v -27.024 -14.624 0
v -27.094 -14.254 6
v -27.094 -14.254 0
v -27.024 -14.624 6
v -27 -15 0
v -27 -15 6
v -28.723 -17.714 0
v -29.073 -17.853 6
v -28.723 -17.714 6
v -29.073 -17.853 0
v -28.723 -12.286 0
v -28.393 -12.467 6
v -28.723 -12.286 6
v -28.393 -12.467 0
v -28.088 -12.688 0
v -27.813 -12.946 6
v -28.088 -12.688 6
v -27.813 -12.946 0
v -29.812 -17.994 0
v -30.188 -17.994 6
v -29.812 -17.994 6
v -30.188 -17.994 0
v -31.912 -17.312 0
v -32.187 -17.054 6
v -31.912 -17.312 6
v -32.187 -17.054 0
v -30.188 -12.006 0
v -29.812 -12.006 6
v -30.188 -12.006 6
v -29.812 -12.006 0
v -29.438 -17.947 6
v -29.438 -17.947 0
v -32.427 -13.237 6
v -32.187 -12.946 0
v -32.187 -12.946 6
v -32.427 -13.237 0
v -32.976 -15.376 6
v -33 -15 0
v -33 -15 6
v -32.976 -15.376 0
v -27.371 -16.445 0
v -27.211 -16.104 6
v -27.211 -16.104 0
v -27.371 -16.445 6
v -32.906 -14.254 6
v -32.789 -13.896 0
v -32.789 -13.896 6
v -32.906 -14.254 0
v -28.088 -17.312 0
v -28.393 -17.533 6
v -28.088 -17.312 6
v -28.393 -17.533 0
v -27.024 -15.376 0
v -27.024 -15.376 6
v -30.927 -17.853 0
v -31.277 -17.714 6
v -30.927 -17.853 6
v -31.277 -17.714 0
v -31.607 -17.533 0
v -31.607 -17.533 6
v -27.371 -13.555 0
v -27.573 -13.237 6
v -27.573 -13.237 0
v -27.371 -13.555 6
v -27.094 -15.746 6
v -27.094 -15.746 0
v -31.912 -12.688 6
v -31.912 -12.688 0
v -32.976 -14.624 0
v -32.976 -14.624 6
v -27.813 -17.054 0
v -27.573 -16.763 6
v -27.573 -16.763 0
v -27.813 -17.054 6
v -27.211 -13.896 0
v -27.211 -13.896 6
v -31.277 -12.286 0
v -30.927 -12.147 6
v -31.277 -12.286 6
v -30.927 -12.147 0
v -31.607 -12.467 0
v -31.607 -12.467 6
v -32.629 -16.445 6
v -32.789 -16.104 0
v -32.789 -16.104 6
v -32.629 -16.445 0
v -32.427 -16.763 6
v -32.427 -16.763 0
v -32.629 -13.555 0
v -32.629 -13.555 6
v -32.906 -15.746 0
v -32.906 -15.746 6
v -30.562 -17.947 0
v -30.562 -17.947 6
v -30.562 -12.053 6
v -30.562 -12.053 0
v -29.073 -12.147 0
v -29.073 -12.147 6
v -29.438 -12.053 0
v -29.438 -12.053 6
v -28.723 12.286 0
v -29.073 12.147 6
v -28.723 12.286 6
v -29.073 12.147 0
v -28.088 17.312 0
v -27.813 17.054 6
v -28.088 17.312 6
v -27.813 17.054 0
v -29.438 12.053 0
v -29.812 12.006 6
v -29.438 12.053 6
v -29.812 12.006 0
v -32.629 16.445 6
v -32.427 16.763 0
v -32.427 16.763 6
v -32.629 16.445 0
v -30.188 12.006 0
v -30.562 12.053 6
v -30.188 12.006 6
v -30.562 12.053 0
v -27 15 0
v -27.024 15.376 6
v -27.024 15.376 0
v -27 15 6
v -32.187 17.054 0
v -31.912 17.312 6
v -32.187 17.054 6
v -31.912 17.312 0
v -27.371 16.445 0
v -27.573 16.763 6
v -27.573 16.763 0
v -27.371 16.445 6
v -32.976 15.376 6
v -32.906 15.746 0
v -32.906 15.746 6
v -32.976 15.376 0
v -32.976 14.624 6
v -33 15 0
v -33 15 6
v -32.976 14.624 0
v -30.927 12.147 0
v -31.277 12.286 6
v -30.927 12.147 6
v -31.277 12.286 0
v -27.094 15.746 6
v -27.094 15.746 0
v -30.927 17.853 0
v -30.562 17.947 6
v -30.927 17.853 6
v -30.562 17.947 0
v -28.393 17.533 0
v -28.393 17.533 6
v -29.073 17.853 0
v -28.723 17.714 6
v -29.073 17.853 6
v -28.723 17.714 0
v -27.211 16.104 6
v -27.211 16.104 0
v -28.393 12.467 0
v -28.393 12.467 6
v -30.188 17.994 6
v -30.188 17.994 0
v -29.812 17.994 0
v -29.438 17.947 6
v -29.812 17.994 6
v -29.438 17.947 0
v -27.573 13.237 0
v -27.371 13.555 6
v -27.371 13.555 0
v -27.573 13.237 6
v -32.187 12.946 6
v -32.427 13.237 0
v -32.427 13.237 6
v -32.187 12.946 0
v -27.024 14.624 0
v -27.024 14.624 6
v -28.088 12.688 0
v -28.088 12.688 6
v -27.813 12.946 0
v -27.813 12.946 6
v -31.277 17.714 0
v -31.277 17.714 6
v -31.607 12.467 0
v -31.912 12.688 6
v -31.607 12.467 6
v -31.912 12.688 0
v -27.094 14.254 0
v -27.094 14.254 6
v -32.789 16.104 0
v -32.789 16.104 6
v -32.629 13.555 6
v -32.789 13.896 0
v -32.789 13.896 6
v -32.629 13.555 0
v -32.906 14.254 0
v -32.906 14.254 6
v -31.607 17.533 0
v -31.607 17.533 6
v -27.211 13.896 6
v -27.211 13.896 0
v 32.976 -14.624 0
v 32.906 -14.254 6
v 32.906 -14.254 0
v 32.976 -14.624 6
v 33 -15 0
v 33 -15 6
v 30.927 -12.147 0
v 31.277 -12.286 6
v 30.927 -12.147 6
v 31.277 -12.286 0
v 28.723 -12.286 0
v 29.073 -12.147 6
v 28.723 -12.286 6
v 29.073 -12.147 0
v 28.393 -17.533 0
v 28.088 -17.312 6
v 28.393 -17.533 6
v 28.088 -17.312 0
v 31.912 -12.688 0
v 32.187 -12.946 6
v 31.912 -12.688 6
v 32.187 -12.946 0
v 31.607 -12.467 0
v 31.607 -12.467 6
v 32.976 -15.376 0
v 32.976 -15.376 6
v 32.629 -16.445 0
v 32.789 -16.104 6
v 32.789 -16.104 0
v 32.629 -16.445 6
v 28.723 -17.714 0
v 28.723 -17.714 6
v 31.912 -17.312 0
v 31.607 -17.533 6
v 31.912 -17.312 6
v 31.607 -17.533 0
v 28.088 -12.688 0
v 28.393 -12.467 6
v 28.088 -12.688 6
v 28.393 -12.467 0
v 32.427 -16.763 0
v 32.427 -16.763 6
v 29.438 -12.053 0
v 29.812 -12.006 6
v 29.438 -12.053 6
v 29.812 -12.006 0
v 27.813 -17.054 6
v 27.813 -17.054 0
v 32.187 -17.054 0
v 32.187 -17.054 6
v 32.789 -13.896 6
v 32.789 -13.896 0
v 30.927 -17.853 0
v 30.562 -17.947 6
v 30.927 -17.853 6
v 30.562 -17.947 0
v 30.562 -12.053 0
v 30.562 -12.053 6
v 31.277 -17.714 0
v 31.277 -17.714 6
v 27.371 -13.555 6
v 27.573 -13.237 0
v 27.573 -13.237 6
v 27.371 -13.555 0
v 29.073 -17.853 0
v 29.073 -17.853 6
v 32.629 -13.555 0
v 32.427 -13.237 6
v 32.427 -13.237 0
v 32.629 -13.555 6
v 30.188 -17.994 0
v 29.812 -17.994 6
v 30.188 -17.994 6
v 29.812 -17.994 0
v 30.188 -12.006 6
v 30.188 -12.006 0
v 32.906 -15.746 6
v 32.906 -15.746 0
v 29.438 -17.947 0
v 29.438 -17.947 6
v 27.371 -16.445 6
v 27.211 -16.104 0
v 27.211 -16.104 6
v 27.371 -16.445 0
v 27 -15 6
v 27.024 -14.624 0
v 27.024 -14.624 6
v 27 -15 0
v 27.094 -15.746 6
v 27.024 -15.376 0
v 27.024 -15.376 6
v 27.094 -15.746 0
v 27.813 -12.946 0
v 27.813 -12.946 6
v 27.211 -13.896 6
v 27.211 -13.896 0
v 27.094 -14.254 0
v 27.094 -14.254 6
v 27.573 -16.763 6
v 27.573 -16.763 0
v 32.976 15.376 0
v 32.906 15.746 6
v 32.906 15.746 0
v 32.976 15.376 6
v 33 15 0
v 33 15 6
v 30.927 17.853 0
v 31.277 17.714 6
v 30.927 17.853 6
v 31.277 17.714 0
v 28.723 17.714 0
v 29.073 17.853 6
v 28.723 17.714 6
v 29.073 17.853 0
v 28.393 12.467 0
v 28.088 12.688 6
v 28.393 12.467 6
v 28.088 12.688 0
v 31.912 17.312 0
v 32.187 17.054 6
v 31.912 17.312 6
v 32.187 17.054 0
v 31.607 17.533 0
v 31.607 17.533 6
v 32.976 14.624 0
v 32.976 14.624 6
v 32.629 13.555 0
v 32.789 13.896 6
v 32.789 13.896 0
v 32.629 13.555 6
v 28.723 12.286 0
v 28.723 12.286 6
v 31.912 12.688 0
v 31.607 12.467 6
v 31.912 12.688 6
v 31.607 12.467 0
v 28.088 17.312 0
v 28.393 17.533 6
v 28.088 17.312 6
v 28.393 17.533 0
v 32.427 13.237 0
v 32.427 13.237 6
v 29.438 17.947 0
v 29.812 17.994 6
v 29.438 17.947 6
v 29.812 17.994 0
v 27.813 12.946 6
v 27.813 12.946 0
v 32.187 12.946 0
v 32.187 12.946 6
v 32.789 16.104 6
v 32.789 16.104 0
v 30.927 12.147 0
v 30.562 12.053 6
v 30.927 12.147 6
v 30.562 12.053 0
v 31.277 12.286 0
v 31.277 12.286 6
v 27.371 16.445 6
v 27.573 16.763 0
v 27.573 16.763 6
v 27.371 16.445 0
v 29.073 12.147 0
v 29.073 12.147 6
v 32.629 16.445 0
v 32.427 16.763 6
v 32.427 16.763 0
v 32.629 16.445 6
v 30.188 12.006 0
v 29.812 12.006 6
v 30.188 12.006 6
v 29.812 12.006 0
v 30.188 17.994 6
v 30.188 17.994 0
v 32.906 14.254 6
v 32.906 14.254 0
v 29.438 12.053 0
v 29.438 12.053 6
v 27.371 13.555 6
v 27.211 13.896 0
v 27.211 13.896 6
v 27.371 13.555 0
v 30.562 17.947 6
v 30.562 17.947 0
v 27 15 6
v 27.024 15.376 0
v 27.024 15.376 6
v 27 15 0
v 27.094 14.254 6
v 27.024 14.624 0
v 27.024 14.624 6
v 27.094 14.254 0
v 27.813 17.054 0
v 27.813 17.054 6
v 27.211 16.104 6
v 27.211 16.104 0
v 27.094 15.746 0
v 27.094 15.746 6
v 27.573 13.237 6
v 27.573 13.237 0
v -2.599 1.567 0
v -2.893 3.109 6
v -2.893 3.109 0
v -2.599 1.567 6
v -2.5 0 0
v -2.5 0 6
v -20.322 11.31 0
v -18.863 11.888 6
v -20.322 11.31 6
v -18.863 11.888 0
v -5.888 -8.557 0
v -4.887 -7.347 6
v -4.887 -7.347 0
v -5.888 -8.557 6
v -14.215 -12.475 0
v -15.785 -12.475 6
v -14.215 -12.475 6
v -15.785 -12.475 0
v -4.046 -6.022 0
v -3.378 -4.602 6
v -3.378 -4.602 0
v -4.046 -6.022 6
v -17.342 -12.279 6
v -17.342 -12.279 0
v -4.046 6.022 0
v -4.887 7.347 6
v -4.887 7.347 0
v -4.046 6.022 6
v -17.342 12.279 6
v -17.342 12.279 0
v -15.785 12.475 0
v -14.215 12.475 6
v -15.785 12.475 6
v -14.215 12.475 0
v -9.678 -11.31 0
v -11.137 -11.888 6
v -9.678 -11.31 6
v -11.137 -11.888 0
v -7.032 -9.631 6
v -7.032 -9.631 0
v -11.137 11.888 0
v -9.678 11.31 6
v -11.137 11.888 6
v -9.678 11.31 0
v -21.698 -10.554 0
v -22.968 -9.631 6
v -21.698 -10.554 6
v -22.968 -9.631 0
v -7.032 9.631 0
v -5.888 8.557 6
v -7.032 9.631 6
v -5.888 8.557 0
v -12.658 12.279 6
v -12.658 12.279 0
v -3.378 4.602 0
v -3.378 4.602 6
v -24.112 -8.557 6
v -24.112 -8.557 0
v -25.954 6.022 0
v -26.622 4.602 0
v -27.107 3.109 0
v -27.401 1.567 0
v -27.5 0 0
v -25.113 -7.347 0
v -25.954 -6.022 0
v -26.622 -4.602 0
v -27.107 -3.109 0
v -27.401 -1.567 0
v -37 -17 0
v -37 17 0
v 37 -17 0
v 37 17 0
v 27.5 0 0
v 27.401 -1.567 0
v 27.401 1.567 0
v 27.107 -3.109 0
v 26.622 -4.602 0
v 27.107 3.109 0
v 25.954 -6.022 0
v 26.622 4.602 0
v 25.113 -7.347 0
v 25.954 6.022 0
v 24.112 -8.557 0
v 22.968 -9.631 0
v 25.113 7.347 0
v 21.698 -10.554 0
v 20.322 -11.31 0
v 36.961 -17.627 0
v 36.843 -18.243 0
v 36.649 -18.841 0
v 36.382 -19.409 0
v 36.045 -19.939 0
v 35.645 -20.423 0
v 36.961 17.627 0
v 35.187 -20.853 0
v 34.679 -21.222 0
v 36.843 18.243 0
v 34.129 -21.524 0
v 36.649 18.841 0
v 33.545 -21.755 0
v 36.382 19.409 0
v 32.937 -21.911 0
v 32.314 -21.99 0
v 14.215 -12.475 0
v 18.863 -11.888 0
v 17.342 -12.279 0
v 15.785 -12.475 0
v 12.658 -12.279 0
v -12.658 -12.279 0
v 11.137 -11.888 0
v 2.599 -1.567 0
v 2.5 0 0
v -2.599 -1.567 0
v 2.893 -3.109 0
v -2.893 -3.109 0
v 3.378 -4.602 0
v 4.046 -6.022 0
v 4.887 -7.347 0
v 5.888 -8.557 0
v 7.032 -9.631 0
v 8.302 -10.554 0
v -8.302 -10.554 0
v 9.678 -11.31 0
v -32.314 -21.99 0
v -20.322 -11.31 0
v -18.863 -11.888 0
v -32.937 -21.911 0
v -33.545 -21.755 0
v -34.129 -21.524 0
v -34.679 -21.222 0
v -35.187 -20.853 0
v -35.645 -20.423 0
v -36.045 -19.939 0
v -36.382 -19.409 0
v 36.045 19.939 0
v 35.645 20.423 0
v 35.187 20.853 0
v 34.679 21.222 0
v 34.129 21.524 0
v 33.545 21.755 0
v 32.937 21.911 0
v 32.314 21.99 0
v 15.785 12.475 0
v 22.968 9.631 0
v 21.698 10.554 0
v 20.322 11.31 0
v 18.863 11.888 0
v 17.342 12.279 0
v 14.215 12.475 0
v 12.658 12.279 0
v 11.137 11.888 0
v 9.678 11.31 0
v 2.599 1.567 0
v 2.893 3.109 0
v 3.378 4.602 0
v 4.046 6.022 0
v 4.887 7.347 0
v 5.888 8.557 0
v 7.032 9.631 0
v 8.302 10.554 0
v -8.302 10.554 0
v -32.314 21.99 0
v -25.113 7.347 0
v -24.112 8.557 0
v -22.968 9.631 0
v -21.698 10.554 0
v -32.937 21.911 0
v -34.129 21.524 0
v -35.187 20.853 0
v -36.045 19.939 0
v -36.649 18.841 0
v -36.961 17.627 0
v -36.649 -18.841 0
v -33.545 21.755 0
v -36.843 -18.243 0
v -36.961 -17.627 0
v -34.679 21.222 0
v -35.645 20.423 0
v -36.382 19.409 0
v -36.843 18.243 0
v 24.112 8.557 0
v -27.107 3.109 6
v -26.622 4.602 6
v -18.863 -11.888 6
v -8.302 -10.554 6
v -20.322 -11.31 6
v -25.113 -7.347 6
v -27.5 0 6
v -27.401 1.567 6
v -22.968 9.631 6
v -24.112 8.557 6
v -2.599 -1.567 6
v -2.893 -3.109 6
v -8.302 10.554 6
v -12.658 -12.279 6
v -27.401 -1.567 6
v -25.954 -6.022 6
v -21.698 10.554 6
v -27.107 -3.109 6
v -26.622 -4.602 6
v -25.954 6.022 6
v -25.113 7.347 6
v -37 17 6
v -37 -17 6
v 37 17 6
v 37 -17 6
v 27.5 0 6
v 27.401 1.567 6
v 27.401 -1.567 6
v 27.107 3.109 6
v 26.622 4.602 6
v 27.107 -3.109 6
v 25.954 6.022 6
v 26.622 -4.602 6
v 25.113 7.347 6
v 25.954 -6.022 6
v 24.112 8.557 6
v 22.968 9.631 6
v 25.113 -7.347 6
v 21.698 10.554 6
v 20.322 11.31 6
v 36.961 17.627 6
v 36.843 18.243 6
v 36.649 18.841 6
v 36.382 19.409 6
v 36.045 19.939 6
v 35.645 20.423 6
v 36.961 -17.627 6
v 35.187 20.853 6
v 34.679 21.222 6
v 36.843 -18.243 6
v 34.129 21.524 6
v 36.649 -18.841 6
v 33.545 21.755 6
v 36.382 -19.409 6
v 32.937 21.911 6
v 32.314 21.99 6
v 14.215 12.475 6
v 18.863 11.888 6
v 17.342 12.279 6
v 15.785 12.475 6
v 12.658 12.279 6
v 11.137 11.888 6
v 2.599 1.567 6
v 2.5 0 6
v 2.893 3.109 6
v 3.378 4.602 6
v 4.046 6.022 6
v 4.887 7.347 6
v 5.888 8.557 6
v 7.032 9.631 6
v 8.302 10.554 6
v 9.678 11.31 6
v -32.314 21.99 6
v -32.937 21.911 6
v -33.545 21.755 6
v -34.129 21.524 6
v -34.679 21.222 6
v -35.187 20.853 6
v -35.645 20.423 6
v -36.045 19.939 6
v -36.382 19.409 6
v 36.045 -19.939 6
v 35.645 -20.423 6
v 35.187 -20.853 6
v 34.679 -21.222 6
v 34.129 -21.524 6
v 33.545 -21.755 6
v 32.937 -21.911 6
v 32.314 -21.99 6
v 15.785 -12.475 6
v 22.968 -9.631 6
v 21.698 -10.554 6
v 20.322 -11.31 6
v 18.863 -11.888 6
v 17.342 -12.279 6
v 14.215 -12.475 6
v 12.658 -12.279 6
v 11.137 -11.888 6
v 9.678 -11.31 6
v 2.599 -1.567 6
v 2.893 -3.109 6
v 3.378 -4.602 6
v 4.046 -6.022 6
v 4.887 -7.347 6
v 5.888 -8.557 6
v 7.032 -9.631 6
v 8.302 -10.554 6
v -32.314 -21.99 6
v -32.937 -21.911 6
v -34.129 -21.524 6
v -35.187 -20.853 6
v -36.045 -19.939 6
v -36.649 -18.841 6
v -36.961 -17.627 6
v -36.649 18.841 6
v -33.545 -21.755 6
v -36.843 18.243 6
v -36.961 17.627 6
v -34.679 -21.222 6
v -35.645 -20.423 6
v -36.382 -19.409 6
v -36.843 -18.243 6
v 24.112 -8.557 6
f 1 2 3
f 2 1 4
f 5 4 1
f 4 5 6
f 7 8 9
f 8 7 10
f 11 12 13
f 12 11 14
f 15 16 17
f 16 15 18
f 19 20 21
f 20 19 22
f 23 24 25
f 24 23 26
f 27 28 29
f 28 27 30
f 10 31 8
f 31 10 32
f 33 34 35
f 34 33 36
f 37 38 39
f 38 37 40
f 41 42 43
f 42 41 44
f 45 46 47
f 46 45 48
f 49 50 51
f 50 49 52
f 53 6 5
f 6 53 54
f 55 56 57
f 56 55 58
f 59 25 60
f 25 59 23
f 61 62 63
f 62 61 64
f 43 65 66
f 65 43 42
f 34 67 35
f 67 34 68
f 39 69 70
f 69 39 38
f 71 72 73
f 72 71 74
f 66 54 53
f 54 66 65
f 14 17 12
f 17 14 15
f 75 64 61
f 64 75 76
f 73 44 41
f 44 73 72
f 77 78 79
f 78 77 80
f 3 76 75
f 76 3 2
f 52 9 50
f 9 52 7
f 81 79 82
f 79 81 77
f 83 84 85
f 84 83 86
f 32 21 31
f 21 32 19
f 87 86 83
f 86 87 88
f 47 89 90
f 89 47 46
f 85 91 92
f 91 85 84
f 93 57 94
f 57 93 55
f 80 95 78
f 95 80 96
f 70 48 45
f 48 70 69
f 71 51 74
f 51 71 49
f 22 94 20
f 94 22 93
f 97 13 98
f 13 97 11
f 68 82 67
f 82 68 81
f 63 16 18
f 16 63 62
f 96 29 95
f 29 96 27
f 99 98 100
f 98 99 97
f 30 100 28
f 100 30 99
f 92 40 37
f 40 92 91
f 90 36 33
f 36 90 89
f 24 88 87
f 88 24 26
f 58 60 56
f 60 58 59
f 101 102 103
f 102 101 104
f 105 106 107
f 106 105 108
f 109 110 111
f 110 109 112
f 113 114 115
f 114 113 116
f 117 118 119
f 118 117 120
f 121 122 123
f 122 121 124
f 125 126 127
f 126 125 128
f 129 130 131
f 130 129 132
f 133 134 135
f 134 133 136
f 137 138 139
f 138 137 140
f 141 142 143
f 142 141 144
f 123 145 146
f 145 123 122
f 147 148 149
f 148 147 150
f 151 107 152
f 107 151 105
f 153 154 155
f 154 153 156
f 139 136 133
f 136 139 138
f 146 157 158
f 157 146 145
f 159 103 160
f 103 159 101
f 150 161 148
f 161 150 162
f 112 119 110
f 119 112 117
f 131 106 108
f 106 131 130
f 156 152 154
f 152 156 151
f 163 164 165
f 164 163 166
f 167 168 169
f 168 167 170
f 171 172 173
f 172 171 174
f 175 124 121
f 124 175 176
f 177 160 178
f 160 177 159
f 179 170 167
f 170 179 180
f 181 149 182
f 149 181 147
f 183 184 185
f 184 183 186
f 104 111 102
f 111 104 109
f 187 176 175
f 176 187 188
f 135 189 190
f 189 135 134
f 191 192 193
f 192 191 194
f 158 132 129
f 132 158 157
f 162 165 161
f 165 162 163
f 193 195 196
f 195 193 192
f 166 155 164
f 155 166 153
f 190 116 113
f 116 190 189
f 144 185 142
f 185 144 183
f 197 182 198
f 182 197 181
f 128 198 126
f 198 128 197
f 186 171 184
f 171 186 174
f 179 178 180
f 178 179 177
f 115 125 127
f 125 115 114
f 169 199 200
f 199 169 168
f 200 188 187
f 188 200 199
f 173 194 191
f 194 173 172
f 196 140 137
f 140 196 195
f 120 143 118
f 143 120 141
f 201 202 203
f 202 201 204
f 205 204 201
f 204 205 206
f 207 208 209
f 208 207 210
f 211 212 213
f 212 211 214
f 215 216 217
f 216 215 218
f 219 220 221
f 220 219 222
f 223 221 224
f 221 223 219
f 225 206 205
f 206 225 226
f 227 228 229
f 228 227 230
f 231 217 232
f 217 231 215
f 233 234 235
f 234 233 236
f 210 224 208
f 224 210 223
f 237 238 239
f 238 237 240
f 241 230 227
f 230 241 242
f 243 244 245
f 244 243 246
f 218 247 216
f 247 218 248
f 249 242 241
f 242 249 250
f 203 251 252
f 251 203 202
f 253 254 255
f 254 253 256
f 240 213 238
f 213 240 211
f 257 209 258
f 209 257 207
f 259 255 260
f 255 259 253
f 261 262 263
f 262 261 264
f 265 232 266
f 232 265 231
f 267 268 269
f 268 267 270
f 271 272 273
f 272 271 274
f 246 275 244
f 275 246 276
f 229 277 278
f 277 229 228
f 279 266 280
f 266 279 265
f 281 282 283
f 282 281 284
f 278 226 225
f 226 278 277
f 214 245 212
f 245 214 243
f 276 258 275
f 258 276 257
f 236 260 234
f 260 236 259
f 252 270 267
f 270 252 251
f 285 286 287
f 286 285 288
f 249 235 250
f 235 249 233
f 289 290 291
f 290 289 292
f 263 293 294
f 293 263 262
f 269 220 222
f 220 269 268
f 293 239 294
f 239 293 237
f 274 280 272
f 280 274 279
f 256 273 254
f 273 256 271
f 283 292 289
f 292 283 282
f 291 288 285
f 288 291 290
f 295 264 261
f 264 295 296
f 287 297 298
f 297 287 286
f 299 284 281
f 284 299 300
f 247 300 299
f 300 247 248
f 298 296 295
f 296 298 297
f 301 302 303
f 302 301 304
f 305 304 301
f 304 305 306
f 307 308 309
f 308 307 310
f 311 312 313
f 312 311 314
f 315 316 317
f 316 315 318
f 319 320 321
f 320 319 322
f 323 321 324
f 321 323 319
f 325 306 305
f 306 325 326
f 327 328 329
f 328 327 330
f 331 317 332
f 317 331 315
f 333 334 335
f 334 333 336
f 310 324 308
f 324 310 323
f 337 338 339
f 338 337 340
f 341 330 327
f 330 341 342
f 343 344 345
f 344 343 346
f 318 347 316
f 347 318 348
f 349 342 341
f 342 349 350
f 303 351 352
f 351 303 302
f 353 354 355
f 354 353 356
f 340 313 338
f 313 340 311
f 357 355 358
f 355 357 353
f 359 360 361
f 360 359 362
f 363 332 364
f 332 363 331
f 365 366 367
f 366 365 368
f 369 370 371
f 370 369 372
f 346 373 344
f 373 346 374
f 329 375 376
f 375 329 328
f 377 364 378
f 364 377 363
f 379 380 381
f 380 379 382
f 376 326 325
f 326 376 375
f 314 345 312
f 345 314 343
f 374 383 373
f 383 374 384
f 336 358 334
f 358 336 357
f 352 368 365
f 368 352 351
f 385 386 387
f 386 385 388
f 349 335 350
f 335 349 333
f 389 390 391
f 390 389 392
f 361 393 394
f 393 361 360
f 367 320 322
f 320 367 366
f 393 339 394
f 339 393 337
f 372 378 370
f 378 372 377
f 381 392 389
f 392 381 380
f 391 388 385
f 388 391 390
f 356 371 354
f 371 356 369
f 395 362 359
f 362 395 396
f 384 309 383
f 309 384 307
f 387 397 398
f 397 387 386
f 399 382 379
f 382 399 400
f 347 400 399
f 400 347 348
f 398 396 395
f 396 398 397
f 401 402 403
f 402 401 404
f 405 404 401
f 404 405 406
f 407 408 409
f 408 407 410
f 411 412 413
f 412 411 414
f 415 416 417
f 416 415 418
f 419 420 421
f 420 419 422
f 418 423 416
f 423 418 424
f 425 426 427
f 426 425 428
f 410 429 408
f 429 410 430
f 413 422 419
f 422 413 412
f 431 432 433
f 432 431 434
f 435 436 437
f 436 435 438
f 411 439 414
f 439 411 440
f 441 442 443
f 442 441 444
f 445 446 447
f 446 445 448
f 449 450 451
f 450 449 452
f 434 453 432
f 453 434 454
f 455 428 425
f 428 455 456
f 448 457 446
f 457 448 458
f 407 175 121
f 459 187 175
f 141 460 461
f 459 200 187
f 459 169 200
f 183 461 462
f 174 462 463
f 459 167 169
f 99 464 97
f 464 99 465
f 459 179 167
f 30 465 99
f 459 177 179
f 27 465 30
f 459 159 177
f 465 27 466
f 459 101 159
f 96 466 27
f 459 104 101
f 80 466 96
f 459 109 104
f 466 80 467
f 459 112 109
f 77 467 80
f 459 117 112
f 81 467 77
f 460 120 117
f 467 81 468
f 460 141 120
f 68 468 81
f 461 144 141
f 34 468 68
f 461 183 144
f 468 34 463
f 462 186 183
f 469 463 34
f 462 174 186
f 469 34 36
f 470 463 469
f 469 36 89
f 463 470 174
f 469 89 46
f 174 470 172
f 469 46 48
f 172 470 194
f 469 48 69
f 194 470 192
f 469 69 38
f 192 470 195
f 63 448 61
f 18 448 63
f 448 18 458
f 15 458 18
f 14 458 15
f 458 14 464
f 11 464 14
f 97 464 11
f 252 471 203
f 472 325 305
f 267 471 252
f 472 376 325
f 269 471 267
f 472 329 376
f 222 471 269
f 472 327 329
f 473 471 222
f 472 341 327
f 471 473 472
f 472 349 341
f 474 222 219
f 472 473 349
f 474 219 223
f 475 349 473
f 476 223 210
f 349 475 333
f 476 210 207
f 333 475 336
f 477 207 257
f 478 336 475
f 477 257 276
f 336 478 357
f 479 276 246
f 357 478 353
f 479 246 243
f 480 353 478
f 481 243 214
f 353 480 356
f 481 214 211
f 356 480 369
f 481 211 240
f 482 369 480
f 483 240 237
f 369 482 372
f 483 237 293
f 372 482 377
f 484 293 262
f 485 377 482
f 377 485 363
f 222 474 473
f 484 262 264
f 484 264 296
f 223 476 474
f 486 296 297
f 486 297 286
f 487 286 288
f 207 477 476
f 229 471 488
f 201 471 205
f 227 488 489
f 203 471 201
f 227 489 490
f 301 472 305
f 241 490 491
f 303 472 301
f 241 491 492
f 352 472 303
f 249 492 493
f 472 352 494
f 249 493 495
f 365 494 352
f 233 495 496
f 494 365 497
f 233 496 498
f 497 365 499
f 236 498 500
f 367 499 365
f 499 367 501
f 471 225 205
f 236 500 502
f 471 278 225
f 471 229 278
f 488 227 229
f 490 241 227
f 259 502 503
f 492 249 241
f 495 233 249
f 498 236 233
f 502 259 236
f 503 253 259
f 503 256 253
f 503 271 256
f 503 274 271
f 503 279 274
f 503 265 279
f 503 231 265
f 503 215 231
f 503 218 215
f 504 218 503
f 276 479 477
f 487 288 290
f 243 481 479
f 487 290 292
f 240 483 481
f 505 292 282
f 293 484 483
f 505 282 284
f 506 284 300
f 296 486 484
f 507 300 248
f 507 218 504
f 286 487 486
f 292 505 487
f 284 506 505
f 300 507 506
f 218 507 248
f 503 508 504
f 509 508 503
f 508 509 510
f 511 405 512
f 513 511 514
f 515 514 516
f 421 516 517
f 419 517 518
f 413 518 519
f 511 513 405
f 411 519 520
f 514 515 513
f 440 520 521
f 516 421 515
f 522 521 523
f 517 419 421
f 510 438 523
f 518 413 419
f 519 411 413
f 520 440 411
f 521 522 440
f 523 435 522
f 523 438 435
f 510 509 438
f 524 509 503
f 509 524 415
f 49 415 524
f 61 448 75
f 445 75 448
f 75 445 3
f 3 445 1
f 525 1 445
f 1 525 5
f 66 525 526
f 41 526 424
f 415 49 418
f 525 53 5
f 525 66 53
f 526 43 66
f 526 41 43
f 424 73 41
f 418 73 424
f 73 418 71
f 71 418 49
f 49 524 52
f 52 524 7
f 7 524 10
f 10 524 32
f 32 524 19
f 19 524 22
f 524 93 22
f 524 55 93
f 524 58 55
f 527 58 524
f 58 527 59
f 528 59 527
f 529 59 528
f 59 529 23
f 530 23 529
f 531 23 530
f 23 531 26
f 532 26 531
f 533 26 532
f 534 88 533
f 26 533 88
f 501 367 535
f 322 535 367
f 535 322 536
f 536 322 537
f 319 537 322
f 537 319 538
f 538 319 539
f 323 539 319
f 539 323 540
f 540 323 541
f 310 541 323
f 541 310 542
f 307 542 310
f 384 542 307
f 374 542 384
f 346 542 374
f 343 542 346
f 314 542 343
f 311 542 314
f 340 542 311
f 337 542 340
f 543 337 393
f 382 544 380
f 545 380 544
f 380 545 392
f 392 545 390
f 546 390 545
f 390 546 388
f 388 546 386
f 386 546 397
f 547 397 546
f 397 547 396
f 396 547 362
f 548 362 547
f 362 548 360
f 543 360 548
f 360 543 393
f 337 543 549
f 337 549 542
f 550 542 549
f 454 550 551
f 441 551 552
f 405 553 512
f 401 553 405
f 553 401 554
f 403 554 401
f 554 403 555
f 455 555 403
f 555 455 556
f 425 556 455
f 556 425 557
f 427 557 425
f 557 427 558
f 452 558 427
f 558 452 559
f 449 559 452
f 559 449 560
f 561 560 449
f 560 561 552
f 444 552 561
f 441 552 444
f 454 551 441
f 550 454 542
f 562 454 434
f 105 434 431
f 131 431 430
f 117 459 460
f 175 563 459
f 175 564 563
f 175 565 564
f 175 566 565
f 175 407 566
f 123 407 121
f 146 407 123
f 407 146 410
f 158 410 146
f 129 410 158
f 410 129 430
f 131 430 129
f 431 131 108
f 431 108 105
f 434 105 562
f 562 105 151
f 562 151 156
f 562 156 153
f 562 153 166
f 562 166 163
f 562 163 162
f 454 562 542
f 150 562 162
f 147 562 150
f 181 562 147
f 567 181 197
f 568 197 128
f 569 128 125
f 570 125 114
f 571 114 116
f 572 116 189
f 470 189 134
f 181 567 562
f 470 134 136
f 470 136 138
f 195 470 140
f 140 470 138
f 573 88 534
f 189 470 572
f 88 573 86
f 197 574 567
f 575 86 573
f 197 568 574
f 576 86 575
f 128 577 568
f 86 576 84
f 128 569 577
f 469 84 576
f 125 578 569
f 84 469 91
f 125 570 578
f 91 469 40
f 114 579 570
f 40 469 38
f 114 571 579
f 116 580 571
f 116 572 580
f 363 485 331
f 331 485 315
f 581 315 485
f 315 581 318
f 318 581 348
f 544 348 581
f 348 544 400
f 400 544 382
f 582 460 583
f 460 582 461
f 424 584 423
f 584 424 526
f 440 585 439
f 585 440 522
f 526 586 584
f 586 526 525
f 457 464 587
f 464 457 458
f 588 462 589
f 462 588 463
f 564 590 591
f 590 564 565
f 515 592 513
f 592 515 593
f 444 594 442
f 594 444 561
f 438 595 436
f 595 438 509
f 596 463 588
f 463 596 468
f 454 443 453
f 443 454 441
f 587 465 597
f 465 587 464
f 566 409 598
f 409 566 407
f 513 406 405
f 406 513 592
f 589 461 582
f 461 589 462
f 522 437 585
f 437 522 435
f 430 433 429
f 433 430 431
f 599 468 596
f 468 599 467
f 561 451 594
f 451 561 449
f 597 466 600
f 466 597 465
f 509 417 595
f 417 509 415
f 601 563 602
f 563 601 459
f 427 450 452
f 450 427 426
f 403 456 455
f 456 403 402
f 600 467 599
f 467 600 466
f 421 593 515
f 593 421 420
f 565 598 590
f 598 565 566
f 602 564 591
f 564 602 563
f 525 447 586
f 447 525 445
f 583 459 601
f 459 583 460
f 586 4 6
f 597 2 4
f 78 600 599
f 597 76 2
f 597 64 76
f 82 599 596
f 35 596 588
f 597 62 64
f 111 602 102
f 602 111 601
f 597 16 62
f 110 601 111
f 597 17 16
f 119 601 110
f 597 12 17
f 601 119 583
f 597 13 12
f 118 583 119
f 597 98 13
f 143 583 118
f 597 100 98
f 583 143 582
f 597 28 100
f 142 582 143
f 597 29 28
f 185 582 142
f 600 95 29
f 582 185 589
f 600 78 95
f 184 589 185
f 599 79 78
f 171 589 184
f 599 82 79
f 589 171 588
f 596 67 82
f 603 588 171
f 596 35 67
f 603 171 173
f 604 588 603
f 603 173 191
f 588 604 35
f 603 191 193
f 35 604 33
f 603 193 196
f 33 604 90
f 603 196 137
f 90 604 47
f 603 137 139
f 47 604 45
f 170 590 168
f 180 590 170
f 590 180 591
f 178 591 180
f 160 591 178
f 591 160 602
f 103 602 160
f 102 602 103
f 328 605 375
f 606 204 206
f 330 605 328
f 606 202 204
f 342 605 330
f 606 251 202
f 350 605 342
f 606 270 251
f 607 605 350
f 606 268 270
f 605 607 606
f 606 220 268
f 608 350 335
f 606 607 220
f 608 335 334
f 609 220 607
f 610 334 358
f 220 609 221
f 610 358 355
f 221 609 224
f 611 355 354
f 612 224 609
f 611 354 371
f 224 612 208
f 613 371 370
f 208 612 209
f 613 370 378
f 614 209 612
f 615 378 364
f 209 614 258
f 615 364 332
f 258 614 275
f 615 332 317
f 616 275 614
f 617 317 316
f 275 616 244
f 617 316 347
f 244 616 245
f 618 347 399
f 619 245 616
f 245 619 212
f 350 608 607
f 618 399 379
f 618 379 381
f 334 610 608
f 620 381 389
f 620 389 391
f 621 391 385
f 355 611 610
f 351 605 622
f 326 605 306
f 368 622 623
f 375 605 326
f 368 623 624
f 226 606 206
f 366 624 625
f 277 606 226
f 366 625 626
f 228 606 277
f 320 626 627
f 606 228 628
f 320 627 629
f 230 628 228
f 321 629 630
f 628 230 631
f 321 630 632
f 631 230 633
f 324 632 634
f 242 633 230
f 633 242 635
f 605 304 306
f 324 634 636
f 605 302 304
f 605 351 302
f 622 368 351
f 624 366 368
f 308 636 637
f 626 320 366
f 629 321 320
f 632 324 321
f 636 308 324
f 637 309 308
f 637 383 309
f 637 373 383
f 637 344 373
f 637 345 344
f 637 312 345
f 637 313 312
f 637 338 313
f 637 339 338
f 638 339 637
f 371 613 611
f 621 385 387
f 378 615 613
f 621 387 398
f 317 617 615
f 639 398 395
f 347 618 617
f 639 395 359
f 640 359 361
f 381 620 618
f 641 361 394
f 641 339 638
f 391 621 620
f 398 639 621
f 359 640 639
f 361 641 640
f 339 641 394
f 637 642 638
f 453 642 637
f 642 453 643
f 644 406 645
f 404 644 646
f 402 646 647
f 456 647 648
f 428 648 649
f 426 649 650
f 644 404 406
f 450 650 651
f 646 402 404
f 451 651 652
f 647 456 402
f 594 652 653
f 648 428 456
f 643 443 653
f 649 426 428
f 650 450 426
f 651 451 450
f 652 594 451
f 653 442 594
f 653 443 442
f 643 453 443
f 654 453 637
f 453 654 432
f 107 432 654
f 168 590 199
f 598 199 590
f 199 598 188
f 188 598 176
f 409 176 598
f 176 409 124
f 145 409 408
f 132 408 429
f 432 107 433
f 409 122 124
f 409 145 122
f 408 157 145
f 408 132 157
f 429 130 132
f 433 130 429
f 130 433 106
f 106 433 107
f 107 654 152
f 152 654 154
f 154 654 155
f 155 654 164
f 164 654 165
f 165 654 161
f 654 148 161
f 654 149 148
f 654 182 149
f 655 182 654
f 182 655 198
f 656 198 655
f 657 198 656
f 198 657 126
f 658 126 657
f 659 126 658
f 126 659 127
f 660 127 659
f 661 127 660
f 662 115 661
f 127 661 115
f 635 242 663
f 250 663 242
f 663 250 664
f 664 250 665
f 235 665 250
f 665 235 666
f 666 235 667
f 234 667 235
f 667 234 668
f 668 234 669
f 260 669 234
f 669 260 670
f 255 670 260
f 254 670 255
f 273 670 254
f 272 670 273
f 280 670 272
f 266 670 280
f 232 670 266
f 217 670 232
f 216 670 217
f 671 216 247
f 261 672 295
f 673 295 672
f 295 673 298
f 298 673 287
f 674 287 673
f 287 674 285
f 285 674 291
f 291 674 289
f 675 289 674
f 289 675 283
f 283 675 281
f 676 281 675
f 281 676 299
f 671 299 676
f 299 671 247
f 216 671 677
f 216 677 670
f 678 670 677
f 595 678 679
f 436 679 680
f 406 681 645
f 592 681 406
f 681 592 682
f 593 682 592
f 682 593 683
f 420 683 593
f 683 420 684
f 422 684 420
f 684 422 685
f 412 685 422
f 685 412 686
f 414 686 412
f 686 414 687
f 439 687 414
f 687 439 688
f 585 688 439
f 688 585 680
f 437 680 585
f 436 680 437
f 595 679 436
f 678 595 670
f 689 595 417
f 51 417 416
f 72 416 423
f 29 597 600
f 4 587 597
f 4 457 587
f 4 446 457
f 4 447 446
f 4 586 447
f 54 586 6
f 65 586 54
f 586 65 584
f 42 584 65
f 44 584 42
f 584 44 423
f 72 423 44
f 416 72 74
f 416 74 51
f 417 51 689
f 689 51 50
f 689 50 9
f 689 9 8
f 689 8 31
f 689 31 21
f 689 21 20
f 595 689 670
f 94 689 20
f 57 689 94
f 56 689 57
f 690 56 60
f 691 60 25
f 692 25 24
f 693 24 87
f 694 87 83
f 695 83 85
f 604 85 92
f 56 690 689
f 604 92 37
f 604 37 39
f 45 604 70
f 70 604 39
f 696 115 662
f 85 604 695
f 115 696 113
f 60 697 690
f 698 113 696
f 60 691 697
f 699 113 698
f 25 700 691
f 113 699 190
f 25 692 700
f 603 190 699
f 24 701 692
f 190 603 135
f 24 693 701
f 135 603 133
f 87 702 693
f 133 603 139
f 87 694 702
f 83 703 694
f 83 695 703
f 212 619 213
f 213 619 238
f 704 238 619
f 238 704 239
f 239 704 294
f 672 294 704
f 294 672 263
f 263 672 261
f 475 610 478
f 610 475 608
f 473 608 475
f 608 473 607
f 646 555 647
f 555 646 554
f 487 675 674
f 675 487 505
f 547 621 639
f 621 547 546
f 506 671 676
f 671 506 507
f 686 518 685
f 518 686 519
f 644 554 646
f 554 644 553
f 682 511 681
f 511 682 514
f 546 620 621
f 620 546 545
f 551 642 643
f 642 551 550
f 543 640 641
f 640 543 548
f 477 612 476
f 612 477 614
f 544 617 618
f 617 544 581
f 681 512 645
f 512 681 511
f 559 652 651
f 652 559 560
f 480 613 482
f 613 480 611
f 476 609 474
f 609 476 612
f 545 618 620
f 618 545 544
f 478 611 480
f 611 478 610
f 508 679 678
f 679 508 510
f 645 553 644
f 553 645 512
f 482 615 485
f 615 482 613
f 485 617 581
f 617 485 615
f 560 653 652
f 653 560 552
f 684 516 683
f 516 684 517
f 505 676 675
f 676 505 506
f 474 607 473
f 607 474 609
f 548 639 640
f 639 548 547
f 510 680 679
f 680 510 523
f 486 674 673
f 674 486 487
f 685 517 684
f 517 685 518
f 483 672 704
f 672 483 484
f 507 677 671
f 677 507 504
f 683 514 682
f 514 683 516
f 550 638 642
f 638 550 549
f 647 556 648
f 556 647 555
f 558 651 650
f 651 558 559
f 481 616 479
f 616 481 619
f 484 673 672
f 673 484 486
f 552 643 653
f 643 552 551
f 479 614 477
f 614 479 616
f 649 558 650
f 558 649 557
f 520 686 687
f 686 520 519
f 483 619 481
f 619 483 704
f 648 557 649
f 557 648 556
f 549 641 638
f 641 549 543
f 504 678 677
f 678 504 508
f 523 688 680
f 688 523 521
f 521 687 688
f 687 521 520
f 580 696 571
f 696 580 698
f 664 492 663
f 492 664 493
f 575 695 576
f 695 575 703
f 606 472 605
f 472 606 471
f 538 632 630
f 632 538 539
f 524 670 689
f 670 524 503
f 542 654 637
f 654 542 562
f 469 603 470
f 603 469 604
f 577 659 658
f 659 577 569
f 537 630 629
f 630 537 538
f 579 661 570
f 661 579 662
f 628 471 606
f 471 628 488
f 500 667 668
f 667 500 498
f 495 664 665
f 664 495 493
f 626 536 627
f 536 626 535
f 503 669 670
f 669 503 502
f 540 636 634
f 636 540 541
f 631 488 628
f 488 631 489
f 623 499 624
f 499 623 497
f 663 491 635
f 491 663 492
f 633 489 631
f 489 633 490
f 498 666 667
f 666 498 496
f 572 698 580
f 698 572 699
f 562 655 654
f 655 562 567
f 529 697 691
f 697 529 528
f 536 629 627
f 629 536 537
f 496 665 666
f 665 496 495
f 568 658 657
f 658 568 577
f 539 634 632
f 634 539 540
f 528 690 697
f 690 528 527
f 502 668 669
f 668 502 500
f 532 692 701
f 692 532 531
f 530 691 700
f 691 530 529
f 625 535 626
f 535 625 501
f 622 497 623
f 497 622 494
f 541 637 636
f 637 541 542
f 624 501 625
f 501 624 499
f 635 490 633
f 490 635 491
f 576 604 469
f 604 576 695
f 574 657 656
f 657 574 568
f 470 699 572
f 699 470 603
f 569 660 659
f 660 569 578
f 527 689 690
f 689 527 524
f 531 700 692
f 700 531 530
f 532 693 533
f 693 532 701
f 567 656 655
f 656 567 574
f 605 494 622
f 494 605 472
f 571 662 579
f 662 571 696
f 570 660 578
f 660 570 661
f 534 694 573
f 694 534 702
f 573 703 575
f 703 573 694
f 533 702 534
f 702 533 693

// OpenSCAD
$fn = 50;


difference() {
	union() {
		hull() {
			translate(v = [-32.0000000000, 17.0000000000, 0]) {
				cylinder(h = 6, r = 5);
			}
			translate(v = [32.0000000000, 17.0000000000, 0]) {
				cylinder(h = 6, r = 5);
			}
			translate(v = [-32.0000000000, -17.0000000000, 0]) {
				cylinder(h = 6, r = 5);
			}
			translate(v = [32.0000000000, -17.0000000000, 0]) {
				cylinder(h = 6, r = 5);
			}
		}
	}
	union() {
		#translate(v = [-30.0000000000, -15.0000000000, -100.0000000000]) {
			cylinder(h = 200, r = 3.0000000000);
		}
		#translate(v = [-30.0000000000, 15.0000000000, -100.0000000000]) {
			cylinder(h = 200, r = 3.0000000000);
		}
		#translate(v = [30.0000000000, -15.0000000000, -100.0000000000]) {
			cylinder(h = 200, r = 3.0000000000);
		}
		#translate(v = [30.0000000000, 15.0000000000, -100.0000000000]) {
			cylinder(h = 200, r = 3.0000000000);
		}
		#translate(v = [-15.0000000000, 0, 0]) {
			cylinder(h = 6, r = 12.5000000000);
		}
		#translate(v = [15.0000000000, 0, 0]) {
			cylinder(h = 6, r = 12.5000000000);
		}
	}
}
